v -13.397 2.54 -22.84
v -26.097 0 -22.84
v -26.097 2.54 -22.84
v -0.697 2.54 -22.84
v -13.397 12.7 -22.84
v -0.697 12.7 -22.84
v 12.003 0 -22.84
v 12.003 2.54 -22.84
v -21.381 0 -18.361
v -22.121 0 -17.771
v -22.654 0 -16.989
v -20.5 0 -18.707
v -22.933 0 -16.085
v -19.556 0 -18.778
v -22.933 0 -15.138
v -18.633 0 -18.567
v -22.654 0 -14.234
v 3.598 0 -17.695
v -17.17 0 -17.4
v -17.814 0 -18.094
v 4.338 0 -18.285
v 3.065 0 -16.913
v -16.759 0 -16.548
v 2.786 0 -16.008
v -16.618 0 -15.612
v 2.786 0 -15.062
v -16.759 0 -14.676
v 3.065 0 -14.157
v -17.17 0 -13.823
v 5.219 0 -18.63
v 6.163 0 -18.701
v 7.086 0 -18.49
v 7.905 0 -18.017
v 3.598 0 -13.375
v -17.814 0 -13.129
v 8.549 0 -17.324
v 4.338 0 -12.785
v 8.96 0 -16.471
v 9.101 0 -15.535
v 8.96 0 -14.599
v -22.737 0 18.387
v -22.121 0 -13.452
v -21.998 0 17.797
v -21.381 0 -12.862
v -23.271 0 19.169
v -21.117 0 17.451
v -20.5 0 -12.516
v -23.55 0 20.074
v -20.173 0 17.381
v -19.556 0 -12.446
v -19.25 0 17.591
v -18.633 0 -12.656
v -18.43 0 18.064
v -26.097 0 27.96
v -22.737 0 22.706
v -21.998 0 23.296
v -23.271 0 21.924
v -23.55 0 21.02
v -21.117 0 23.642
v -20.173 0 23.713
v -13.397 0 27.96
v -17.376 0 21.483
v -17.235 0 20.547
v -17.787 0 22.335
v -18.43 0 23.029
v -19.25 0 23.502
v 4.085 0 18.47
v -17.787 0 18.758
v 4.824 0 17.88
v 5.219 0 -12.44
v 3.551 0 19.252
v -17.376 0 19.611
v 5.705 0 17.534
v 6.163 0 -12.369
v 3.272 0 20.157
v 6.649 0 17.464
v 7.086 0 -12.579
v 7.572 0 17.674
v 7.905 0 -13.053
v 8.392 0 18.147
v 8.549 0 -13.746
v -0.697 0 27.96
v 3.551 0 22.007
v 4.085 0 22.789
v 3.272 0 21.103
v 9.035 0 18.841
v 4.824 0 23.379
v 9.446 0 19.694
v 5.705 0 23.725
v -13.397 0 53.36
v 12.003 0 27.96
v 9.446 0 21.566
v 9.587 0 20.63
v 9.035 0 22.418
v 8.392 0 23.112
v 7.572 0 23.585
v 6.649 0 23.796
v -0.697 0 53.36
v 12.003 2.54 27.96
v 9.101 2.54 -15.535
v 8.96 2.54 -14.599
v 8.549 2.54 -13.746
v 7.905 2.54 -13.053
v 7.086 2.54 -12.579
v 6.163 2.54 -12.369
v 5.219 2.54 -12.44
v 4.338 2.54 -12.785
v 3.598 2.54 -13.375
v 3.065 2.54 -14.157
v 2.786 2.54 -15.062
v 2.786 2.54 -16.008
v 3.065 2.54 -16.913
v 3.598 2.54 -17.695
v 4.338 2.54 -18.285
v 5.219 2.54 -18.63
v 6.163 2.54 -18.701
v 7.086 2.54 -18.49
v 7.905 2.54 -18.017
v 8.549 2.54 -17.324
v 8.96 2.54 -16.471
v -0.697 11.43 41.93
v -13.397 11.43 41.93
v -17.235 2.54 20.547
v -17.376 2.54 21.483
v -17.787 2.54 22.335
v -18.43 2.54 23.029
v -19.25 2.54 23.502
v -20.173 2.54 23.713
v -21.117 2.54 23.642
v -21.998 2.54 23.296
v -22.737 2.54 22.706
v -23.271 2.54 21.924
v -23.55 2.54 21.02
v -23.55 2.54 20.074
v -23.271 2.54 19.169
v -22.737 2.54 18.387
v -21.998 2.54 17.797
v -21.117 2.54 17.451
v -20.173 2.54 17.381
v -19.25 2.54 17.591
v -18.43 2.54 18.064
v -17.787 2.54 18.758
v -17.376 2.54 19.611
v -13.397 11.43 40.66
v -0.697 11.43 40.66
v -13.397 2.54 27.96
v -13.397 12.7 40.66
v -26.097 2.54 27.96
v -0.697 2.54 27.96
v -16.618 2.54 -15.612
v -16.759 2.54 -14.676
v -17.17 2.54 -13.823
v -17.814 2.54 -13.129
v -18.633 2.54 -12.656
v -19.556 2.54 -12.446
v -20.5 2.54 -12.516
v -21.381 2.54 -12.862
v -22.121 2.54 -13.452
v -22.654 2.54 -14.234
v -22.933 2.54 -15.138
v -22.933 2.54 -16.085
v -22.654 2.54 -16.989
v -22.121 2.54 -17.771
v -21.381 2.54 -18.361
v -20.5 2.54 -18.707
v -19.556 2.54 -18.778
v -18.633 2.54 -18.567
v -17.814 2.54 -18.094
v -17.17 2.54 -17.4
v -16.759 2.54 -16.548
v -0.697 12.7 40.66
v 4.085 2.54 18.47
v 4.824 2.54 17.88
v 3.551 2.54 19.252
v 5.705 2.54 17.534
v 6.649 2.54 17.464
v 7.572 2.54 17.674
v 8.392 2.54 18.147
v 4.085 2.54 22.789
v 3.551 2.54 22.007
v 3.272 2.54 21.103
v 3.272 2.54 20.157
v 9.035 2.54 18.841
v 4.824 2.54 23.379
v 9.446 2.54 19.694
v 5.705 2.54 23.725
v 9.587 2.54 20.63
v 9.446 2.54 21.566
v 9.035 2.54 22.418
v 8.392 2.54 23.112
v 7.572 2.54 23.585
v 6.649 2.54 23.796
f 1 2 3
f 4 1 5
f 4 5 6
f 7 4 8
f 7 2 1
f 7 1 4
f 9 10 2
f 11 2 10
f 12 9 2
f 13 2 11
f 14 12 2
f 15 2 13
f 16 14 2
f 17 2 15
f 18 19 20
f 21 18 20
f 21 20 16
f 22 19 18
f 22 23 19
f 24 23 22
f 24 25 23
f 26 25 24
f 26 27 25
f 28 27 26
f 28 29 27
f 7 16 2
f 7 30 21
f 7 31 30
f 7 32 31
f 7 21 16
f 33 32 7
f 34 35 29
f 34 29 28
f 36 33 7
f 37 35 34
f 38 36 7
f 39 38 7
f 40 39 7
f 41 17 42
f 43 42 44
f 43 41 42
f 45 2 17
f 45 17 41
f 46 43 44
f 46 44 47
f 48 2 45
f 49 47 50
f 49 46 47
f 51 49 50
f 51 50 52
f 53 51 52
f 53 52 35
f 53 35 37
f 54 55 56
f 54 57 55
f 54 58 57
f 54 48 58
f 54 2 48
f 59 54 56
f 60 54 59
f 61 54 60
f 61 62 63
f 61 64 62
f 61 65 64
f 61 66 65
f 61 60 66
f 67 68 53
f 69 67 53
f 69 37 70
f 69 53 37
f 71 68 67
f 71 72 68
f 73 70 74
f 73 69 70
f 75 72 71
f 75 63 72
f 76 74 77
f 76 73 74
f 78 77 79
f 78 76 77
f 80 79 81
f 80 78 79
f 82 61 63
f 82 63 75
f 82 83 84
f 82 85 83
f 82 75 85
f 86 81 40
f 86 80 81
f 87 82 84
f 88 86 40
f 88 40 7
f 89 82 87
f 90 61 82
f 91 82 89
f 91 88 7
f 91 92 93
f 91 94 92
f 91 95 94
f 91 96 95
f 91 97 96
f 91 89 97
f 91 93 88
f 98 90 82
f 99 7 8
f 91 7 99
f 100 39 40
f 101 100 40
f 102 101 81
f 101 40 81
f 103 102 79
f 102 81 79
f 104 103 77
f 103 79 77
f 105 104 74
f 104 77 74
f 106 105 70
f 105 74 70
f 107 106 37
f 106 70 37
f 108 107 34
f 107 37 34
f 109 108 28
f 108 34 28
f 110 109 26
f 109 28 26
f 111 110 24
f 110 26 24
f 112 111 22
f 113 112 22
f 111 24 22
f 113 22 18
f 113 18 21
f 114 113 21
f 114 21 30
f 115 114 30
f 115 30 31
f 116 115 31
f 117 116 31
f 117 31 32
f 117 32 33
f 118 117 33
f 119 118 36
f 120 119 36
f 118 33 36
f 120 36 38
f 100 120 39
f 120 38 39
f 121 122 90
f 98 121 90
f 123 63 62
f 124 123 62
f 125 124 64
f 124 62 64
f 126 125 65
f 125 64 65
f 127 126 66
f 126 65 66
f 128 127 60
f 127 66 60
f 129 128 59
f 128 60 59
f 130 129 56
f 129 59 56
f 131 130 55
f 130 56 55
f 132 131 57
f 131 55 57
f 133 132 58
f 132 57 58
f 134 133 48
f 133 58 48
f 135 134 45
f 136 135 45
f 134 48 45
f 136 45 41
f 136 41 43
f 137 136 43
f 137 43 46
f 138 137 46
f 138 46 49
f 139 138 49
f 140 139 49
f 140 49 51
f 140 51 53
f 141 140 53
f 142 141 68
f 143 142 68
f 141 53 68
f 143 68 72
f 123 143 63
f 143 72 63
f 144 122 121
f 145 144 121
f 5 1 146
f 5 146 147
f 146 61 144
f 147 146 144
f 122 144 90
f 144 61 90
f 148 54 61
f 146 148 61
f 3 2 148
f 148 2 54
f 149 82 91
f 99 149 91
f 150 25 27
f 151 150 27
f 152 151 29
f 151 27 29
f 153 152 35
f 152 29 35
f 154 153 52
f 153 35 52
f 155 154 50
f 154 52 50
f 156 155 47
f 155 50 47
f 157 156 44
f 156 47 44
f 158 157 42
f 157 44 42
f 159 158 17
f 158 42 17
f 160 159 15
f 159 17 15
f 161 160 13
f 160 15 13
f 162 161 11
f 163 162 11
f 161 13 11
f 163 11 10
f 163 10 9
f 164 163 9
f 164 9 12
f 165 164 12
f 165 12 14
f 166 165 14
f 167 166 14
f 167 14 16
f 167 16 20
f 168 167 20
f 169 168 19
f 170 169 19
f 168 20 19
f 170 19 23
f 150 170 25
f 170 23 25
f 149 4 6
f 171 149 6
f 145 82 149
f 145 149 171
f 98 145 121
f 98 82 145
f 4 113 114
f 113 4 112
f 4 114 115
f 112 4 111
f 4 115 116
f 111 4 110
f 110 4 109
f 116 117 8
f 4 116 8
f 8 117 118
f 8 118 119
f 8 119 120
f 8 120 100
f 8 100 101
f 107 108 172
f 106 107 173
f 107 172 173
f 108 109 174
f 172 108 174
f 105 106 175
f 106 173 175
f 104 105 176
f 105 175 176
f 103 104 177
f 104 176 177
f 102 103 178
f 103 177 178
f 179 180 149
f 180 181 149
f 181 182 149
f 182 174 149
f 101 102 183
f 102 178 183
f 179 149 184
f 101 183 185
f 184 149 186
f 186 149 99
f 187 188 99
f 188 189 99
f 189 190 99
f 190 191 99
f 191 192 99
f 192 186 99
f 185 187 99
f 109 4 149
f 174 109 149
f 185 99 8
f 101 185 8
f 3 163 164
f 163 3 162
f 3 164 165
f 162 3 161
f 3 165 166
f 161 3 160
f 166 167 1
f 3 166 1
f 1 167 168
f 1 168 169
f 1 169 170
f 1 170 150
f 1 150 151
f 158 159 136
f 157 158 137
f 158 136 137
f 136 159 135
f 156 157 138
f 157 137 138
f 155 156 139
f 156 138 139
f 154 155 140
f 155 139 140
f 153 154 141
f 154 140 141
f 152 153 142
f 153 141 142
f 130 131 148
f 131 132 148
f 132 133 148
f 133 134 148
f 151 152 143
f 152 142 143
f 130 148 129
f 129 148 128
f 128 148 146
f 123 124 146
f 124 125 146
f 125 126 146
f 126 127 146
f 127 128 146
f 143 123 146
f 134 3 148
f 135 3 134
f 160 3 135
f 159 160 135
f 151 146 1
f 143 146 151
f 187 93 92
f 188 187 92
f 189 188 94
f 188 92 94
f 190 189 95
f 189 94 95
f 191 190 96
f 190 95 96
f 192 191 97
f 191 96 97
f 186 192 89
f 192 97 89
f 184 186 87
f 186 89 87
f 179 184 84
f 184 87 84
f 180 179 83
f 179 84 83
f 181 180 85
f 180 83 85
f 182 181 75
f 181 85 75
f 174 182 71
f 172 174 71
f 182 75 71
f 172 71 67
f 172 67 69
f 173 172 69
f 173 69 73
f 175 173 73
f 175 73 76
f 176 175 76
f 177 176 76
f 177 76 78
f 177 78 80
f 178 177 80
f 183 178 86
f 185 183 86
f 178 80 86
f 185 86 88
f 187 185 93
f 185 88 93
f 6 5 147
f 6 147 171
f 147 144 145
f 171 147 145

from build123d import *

# Parameters (mm, degrees)
F0_W     = 12.7
F0_H     = 50.8
F0_H_2   = 12.7
F1_DEPTH = 12.7
F0_R     = 3.175
F2_DEPTH = 2.54
F3_DEPTH = 11.43
F5_DEPTH = 12.7


with BuildPart() as f1:
    # F0 (on Front) → F1 (new body)
    with BuildSketch(Plane.XZ):
        with Locations((-7.0469496608, 2.5596140835)):
            Rectangle(F0_W, F0_H)
        with Locations((-7.0469496608, 34.3096140835)):
            Rectangle(F0_W, F0_H_2)
    extrude(amount=-F1_DEPTH)

    # F0 (on Front) → F2 (join)
    with BuildSketch(Plane.XZ):
        with Locations((-19.7469496608, 2.5596140835)):
            Rectangle(F0_W, F0_H)
        with Locations((-19.7934154421, -15.6117072329)):
            Circle(F0_R, mode=Mode.SUBTRACT)
        with Locations((-20.4100394858, 20.5467736741)):
            Circle(F0_R, mode=Mode.SUBTRACT)
        with Locations((5.6530503392, 2.5596140835)):
            Rectangle(F0_W, F0_H)
        with Locations((5.9255640863, -15.5349638661)):
            Circle(F0_R, mode=Mode.SUBTRACT)
        with Locations((6.4119519666, 20.6297561526)):
            Circle(F0_R, mode=Mode.SUBTRACT)
    extrude(amount=-F2_DEPTH)

    # F0 (on Front) → F3 (join)
    with BuildSketch(Plane.XZ):
        with Locations((-7.0469496608, 47.0096140835)):
            Rectangle(F0_W, F0_H_2)
    extrude(amount=-F3_DEPTH)

    # F4 (on face) → F5 (cut)
    with BuildSketch(Plane(origin=(-13.3969496608, 0, 0), x_dir=(0, -1, 0), z_dir=(-1, 0, 0))):
        Polygon((0, 53.3596140835), (-11.43, 53.3596140835), (-11.43, 41.9296140835), align=None)
    extrude(amount=-F5_DEPTH, mode=Mode.SUBTRACT)


solid = f1.part
